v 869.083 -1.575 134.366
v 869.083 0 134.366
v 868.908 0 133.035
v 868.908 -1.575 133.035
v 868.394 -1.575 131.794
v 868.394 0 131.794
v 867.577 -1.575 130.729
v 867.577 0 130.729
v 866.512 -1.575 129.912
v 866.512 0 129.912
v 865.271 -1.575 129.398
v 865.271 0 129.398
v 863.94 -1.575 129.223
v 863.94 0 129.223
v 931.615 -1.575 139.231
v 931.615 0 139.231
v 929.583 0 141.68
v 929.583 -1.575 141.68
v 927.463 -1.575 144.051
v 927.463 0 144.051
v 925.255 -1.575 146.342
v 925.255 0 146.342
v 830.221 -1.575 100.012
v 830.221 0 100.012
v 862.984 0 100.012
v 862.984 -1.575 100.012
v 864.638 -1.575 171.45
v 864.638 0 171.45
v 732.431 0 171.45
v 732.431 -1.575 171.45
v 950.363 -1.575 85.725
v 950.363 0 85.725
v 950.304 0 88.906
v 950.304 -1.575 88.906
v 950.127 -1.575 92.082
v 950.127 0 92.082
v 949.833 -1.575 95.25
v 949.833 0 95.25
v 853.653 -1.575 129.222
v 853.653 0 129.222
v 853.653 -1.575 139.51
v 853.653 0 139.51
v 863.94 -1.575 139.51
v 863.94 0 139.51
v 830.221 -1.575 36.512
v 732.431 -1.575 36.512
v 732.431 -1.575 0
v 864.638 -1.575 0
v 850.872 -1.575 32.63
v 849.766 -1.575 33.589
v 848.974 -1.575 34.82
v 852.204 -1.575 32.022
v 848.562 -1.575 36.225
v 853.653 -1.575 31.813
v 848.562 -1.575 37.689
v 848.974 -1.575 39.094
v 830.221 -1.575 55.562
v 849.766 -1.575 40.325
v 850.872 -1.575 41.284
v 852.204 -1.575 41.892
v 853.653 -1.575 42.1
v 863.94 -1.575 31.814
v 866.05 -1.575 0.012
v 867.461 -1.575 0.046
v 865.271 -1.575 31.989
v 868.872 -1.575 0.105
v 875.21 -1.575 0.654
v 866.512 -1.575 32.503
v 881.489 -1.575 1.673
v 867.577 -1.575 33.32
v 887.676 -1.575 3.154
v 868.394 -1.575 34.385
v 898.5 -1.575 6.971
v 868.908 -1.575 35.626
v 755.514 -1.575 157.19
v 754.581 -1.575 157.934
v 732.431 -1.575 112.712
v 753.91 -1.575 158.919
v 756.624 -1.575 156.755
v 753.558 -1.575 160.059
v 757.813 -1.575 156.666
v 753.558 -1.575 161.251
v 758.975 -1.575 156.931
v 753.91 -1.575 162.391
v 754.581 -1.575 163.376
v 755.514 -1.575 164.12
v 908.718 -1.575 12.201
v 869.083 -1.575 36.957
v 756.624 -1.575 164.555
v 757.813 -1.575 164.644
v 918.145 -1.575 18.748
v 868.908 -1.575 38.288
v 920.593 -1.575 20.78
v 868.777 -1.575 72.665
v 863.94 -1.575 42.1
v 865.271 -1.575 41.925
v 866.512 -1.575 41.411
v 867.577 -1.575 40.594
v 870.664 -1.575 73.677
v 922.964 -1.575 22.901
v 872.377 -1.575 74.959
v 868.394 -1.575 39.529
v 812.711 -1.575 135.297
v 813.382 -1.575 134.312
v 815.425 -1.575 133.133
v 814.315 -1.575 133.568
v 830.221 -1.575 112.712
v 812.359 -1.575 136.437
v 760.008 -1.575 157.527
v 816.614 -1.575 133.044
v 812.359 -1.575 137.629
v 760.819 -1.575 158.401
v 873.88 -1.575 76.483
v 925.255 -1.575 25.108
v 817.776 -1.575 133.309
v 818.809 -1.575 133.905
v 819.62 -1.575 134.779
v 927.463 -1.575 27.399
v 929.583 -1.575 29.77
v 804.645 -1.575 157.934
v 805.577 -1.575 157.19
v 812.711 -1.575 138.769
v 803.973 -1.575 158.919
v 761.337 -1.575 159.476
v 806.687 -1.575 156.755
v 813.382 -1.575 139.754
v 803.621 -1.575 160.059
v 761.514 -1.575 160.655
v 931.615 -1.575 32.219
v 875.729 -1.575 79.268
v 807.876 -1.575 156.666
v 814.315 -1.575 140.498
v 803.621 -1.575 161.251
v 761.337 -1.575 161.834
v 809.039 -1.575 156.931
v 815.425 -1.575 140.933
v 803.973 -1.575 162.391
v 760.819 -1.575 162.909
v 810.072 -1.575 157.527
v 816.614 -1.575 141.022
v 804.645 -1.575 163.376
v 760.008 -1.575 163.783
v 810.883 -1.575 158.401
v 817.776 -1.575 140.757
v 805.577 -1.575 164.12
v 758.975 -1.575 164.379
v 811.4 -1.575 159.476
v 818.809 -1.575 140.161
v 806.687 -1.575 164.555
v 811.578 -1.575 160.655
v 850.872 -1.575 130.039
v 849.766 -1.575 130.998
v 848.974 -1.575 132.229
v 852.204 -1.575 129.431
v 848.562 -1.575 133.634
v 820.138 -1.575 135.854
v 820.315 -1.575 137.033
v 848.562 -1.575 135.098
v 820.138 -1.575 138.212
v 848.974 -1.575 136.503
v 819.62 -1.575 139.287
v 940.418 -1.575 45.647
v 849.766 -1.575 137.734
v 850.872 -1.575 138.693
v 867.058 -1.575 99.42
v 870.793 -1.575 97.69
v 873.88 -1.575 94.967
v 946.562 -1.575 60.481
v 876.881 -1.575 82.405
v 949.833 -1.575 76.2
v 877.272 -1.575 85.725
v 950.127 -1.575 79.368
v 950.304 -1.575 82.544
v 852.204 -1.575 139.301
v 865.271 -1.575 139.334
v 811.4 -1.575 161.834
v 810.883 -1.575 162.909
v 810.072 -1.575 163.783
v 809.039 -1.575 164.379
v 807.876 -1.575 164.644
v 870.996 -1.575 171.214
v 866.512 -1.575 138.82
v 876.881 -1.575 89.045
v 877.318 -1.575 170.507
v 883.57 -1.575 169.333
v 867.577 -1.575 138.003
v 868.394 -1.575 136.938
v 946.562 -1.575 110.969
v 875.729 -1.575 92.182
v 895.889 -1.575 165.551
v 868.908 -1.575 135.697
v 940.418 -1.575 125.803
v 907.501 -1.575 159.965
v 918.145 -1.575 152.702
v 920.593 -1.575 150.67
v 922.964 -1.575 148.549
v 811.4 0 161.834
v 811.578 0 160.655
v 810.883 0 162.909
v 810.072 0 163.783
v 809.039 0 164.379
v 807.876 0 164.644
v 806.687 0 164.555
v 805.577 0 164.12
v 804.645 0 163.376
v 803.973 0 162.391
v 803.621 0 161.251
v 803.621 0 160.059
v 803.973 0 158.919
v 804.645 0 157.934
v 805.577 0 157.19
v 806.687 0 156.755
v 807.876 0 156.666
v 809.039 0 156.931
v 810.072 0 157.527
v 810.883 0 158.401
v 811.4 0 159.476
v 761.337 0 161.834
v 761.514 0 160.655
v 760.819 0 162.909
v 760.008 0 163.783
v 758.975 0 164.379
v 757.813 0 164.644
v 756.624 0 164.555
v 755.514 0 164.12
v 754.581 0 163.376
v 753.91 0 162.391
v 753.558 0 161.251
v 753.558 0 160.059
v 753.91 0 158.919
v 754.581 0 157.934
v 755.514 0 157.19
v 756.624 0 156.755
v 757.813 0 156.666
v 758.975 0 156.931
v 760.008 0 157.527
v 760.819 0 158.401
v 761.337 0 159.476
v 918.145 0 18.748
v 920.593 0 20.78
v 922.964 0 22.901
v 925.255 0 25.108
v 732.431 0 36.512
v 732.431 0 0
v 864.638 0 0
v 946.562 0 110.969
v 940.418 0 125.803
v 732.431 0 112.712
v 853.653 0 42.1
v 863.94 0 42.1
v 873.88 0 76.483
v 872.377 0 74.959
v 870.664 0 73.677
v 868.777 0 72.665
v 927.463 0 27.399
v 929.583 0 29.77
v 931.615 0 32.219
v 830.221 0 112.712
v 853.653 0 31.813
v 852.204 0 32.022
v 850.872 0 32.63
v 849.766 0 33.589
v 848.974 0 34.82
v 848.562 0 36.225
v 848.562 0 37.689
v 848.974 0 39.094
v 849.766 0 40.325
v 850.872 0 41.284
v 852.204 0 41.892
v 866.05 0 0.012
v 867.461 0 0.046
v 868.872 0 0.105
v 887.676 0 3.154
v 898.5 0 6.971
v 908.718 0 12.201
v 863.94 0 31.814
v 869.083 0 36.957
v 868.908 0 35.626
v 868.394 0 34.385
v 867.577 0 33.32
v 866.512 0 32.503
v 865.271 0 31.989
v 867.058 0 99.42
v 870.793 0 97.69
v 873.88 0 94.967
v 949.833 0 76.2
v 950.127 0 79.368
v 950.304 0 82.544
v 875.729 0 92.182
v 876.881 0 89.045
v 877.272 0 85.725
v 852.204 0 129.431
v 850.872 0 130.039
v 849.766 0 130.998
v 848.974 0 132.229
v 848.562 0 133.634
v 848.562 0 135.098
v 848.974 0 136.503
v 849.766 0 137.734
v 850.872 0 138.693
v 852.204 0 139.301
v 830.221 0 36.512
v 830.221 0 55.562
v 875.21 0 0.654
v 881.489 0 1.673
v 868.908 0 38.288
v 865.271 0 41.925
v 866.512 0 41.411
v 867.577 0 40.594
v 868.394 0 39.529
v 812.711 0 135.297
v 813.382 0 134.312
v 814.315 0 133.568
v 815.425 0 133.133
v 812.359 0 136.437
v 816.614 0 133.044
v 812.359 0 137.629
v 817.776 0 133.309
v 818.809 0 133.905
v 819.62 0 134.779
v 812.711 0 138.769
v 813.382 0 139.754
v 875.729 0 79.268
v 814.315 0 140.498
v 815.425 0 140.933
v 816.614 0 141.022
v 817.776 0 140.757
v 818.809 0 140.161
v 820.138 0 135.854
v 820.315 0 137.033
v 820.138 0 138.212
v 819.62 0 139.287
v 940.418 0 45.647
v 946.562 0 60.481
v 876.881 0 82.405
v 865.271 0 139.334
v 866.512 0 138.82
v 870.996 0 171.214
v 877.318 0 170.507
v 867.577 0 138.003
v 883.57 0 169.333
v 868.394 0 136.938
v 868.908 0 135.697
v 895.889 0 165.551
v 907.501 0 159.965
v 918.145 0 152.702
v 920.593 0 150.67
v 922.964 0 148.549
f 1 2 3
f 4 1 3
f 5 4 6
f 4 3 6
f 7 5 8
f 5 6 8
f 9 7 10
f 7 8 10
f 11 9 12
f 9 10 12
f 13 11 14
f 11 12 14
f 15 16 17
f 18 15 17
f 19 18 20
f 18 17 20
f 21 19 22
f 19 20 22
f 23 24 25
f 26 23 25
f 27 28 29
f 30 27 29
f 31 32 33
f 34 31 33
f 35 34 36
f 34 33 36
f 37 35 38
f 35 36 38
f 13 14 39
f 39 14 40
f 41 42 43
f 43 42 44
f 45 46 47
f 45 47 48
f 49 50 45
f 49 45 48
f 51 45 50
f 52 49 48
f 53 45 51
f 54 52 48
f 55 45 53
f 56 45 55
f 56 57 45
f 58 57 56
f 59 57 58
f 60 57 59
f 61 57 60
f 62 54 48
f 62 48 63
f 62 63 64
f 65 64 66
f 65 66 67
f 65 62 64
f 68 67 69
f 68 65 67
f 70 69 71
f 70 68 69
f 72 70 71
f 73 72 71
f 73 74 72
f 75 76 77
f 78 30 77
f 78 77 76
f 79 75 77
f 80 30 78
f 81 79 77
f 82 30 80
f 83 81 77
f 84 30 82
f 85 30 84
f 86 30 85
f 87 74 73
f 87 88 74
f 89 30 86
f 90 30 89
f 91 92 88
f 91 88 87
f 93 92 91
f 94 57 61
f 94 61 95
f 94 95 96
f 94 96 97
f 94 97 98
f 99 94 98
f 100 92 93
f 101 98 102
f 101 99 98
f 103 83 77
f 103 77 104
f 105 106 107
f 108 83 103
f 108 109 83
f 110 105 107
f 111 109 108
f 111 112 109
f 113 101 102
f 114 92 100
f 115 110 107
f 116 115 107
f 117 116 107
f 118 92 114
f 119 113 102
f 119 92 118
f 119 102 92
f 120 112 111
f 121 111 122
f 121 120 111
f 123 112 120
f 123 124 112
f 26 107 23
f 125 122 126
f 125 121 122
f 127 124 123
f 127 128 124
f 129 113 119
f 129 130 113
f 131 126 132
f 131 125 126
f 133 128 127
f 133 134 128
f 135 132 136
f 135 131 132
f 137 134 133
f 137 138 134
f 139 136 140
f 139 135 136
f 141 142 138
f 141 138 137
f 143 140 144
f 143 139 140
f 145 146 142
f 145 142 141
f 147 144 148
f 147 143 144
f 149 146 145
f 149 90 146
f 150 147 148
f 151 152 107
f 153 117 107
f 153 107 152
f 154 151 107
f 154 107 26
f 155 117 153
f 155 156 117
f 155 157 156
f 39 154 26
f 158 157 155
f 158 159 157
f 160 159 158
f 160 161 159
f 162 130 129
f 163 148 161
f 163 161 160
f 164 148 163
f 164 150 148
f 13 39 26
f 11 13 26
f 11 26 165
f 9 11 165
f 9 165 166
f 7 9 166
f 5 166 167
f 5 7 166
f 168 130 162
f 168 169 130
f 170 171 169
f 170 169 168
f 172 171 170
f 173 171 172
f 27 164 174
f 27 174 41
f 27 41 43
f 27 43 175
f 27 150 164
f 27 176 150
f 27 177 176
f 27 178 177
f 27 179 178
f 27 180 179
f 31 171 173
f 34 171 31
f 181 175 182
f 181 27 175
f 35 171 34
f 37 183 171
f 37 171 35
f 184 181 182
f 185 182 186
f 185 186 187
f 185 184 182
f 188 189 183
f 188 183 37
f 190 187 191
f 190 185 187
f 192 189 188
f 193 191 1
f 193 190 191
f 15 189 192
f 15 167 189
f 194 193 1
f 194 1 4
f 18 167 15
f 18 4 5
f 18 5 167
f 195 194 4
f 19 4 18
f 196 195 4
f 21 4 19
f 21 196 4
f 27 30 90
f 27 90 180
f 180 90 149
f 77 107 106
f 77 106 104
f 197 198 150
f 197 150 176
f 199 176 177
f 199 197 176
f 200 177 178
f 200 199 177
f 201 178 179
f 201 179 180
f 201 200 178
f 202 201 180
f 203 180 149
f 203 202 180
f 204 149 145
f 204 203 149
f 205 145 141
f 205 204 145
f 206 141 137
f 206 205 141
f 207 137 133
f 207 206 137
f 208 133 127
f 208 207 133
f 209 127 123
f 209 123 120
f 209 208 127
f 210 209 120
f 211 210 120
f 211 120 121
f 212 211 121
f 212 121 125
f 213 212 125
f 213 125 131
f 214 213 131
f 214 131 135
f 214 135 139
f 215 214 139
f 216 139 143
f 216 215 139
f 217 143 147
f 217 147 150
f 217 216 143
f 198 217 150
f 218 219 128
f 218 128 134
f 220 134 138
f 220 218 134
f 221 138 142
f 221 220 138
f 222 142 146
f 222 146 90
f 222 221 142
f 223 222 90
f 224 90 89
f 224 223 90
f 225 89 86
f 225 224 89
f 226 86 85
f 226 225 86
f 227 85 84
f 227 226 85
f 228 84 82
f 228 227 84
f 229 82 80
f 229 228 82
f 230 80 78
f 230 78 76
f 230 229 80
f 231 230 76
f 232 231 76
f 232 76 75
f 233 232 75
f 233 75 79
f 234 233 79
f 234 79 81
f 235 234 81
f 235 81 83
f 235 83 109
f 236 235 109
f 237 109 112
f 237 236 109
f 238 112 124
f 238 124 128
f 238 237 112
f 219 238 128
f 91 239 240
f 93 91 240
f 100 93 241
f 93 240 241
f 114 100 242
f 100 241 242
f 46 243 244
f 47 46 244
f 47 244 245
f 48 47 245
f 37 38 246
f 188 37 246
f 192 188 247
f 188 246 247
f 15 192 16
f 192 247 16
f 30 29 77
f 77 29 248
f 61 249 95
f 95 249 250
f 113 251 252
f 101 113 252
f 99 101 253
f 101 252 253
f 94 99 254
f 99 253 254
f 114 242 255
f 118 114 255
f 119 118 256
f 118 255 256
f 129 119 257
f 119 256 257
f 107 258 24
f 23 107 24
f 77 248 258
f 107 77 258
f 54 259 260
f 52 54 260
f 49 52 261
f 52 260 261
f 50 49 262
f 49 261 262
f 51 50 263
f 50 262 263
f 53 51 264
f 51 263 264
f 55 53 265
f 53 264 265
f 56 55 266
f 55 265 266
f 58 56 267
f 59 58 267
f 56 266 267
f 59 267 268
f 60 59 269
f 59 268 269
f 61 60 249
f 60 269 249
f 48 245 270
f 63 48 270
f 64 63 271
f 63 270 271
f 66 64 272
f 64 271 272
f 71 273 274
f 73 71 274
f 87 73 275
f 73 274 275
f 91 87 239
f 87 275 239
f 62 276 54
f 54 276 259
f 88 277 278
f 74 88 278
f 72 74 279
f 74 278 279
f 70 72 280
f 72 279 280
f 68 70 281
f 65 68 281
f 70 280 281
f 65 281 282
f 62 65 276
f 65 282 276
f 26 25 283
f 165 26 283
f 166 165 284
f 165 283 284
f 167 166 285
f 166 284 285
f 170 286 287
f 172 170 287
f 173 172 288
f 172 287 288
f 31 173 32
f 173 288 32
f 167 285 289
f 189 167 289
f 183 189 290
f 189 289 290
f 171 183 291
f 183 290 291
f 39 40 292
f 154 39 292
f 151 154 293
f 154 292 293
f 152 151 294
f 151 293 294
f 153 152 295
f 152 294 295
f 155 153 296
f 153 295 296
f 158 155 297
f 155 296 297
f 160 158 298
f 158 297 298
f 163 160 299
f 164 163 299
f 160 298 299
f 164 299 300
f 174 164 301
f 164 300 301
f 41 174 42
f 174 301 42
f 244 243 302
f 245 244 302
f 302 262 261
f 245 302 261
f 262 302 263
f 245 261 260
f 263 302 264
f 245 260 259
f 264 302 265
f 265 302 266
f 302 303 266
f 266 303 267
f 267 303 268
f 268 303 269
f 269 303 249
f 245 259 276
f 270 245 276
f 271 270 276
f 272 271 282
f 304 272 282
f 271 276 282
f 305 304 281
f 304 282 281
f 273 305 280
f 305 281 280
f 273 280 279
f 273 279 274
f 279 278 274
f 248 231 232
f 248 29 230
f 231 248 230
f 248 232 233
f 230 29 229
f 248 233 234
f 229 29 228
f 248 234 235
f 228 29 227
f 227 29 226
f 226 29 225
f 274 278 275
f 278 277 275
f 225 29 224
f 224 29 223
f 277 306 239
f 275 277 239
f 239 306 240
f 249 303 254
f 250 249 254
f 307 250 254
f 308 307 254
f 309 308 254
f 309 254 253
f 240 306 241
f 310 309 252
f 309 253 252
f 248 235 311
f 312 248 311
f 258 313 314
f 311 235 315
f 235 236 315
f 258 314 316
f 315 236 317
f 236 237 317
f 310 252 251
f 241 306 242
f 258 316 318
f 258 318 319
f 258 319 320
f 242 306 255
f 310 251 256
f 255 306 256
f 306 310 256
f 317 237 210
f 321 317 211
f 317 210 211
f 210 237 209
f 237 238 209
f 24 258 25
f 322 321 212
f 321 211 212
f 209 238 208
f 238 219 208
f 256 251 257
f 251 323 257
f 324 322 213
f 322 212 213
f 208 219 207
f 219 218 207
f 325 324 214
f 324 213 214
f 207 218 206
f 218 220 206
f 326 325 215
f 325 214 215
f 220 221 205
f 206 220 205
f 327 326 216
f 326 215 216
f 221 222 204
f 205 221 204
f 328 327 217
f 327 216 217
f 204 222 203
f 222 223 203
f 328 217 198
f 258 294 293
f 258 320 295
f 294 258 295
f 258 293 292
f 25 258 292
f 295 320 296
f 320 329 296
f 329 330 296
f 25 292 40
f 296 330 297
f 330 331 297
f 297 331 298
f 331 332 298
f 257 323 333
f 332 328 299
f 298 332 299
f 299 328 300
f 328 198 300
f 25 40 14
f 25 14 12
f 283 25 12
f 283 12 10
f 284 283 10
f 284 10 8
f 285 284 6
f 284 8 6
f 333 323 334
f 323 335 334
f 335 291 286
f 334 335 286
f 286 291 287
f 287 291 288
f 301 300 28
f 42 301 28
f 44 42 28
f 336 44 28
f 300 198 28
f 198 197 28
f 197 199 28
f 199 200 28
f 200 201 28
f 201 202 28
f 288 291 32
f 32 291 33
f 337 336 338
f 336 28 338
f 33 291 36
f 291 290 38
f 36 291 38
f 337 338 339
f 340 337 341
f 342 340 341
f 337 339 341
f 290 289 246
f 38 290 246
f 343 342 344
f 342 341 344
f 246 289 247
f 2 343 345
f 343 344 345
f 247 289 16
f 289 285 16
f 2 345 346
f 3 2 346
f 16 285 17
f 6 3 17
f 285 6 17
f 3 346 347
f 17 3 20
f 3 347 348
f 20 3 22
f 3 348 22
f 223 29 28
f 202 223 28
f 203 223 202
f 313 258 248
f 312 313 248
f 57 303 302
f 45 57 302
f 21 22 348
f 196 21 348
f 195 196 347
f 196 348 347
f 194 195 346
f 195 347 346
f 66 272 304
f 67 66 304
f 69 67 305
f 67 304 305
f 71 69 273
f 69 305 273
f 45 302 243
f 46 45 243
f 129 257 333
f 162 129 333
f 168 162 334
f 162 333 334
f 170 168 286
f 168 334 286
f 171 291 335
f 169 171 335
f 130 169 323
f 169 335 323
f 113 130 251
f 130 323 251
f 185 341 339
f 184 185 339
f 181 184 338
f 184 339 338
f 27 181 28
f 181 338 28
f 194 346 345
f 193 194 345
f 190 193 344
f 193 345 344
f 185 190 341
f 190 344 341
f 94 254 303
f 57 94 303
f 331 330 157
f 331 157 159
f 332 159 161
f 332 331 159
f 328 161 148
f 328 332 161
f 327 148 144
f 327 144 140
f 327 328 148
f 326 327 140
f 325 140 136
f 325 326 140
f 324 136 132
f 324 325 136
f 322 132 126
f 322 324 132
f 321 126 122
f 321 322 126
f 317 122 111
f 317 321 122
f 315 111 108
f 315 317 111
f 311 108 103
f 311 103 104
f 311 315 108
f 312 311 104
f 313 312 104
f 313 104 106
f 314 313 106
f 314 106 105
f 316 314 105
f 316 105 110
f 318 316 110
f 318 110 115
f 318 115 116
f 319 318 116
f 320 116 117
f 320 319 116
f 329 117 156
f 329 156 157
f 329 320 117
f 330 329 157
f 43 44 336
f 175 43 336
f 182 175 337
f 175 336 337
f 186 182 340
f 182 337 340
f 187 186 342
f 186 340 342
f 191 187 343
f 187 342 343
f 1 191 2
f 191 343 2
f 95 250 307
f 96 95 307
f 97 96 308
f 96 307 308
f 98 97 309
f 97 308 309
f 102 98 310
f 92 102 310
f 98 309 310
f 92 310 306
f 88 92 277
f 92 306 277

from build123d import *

# Parameters (mm, degrees)
F0_R     = 4.0005
F1_DEPTH = 1.5748


with BuildPart() as f1:
    # F0 (on Front) → F1 (new body)
    with BuildSketch(Plane.XZ):
        with BuildLine():
            Line((732.4313869209, 36.5125), (732.4313869209, 0))
            Line((732.4313869209, 0), (864.6383869209, 0))
            ThreePointArc((864.6383869209, 0), (866.7557920134, 0.0261539128), (868.8719051041, 0.1045996926))
            ThreePointArc((868.8719051041, 0.1045996926), (878.3590689291, 1.1051529768), (887.6763155537, 3.1536401389))
            ThreePointArc((887.6763155537, 3.1536401389), (903.696677756, 9.4149381337), (918.1445842563, 18.748418483))
            ThreePointArc((918.1445842563, 18.748418483), (921.7883869209, 21.8293575429), (925.2551157381, 25.1082711828))
            Line((925.2551157381, 25.1082711828), (873.8802209099, 76.483166011))
            ThreePointArc((873.8802209099, 76.483166011), (871.5444569052, 74.2857554291), (868.7774235028, 72.664665394))
            Line((868.7774235028, 72.664665394), (830.2213869209, 55.5625))
            Line((830.2213869209, 55.5625), (830.2213869209, 36.5125))
            Line((830.2213869209, 36.5125), (747.6713869209, 36.5125))
            Line((747.6713869209, 36.5125), (732.4313869209, 36.5125))
        make_face()
        with BuildLine():
            ThreePointArc((853.6528869209, 31.8135), (848.5093869209, 36.957), (853.6528869209, 42.1005))
            Line((853.6528869209, 42.1005), (863.9398869209, 42.1005))
            ThreePointArc((863.9398869209, 42.1005), (867.57689065, 40.594003729), (869.0833869209, 36.957))
            ThreePointArc((869.0833869209, 36.957), (867.57689065, 33.319996271), (863.9398869209, 31.8135))
            Line((863.9398869209, 31.8135), (853.6528869209, 31.8135))
        make_face(mode=Mode.SUBTRACT)
        with BuildLine():
            Line((732.4313869209, 112.7125), (747.6713869209, 112.7125))
            Line((747.6713869209, 112.7125), (830.2213869209, 112.7125))
            Line((830.2213869209, 112.7125), (830.2213869209, 100.0125))
            Line((830.2213869209, 100.0125), (862.984296866, 100.0125))
            ThreePointArc((862.984296866, 100.0125), (868.9880437433, 98.6898632728), (873.8802209099, 94.966833989))
            Line((873.8802209099, 94.966833989), (925.2551157381, 146.3417288172))
            ThreePointArc((925.2551157381, 146.3417288172), (921.7883869209, 149.6206424571), (918.1445842563, 152.701581517))
            ThreePointArc((918.1445842563, 152.701581517), (901.799905044, 162.9765190517), (883.5704291304, 169.3333333333))
            ThreePointArc((883.5704291304, 169.3333333333), (874.1633869209, 170.9191899427), (864.6383869209, 171.45))
            Line((864.6383869209, 171.45), (858.2883869209, 171.45))
            Line((858.2883869209, 171.45), (839.2383869209, 171.45))
            Line((839.2383869209, 171.45), (749.5336282768, 171.45))
            Line((749.5336282768, 171.45), (732.4313869209, 171.45))
            Line((732.4313869209, 171.45), (732.4313869209, 112.7125))
        make_face()
        with Locations((816.3148869209, 137.033)):
            Circle(F0_R, mode=Mode.SUBTRACT)
        with BuildLine():
            ThreePointArc((853.6528869209, 129.2225), (848.5093869209, 134.366), (853.6528869209, 139.5095))
            Line((853.6528869209, 139.5095), (863.9398869209, 139.5095))
            ThreePointArc((863.9398869209, 139.5095), (867.57689065, 138.003003729), (869.0833869209, 134.366))
            ThreePointArc((869.0833869209, 134.366), (867.57689065, 130.728996271), (863.9398869209, 129.2225))
            Line((863.9398869209, 129.2225), (853.6528869209, 129.2225))
        make_face(mode=Mode.SUBTRACT)
        with Locations((757.5138869209, 160.655)):
            Circle(F0_R, mode=Mode.SUBTRACT)
        with Locations((807.5772869209, 160.655)):
            Circle(F0_R, mode=Mode.SUBTRACT)
        with BuildLine():
            Line((873.8802209099, 76.483166011), (925.2551157381, 25.1082711828))
            ThreePointArc((925.2551157381, 25.1082711828), (928.534029378, 28.575), (931.6149684379, 32.2188026646))
            ThreePointArc((931.6149684379, 32.2188026646), (943.8379598455, 52.9194627605), (949.8325768637, 76.2))
            ThreePointArc((949.8325768637, 76.2), (950.2305815354, 80.9551104752), (950.3633869209, 85.725))
            Line((950.3633869209, 85.725), (877.271796866, 85.725))
            ThreePointArc((877.271796866, 85.725), (876.3971297328, 80.8027473921), (873.8802209099, 76.483166011))
        make_face()
        with BuildLine():
            ThreePointArc((873.8802209099, 94.966833989), (876.3971297328, 90.6472526079), (877.271796866, 85.725))
            Line((877.271796866, 85.725), (950.3633869209, 85.725))
            ThreePointArc((950.3633869209, 85.725), (950.2305815354, 90.4948895248), (949.8325768637, 95.25))
            ThreePointArc((949.8325768637, 95.25), (943.8379598455, 118.5305372395), (931.6149684379, 139.2311973354))
            ThreePointArc((931.6149684379, 139.2311973354), (928.534029378, 142.875), (925.2551157381, 146.3417288172))
            Line((925.2551157381, 146.3417288172), (873.8802209099, 94.966833989))
        make_face()
    extrude(amount=F1_DEPTH)


solid = f1.part
